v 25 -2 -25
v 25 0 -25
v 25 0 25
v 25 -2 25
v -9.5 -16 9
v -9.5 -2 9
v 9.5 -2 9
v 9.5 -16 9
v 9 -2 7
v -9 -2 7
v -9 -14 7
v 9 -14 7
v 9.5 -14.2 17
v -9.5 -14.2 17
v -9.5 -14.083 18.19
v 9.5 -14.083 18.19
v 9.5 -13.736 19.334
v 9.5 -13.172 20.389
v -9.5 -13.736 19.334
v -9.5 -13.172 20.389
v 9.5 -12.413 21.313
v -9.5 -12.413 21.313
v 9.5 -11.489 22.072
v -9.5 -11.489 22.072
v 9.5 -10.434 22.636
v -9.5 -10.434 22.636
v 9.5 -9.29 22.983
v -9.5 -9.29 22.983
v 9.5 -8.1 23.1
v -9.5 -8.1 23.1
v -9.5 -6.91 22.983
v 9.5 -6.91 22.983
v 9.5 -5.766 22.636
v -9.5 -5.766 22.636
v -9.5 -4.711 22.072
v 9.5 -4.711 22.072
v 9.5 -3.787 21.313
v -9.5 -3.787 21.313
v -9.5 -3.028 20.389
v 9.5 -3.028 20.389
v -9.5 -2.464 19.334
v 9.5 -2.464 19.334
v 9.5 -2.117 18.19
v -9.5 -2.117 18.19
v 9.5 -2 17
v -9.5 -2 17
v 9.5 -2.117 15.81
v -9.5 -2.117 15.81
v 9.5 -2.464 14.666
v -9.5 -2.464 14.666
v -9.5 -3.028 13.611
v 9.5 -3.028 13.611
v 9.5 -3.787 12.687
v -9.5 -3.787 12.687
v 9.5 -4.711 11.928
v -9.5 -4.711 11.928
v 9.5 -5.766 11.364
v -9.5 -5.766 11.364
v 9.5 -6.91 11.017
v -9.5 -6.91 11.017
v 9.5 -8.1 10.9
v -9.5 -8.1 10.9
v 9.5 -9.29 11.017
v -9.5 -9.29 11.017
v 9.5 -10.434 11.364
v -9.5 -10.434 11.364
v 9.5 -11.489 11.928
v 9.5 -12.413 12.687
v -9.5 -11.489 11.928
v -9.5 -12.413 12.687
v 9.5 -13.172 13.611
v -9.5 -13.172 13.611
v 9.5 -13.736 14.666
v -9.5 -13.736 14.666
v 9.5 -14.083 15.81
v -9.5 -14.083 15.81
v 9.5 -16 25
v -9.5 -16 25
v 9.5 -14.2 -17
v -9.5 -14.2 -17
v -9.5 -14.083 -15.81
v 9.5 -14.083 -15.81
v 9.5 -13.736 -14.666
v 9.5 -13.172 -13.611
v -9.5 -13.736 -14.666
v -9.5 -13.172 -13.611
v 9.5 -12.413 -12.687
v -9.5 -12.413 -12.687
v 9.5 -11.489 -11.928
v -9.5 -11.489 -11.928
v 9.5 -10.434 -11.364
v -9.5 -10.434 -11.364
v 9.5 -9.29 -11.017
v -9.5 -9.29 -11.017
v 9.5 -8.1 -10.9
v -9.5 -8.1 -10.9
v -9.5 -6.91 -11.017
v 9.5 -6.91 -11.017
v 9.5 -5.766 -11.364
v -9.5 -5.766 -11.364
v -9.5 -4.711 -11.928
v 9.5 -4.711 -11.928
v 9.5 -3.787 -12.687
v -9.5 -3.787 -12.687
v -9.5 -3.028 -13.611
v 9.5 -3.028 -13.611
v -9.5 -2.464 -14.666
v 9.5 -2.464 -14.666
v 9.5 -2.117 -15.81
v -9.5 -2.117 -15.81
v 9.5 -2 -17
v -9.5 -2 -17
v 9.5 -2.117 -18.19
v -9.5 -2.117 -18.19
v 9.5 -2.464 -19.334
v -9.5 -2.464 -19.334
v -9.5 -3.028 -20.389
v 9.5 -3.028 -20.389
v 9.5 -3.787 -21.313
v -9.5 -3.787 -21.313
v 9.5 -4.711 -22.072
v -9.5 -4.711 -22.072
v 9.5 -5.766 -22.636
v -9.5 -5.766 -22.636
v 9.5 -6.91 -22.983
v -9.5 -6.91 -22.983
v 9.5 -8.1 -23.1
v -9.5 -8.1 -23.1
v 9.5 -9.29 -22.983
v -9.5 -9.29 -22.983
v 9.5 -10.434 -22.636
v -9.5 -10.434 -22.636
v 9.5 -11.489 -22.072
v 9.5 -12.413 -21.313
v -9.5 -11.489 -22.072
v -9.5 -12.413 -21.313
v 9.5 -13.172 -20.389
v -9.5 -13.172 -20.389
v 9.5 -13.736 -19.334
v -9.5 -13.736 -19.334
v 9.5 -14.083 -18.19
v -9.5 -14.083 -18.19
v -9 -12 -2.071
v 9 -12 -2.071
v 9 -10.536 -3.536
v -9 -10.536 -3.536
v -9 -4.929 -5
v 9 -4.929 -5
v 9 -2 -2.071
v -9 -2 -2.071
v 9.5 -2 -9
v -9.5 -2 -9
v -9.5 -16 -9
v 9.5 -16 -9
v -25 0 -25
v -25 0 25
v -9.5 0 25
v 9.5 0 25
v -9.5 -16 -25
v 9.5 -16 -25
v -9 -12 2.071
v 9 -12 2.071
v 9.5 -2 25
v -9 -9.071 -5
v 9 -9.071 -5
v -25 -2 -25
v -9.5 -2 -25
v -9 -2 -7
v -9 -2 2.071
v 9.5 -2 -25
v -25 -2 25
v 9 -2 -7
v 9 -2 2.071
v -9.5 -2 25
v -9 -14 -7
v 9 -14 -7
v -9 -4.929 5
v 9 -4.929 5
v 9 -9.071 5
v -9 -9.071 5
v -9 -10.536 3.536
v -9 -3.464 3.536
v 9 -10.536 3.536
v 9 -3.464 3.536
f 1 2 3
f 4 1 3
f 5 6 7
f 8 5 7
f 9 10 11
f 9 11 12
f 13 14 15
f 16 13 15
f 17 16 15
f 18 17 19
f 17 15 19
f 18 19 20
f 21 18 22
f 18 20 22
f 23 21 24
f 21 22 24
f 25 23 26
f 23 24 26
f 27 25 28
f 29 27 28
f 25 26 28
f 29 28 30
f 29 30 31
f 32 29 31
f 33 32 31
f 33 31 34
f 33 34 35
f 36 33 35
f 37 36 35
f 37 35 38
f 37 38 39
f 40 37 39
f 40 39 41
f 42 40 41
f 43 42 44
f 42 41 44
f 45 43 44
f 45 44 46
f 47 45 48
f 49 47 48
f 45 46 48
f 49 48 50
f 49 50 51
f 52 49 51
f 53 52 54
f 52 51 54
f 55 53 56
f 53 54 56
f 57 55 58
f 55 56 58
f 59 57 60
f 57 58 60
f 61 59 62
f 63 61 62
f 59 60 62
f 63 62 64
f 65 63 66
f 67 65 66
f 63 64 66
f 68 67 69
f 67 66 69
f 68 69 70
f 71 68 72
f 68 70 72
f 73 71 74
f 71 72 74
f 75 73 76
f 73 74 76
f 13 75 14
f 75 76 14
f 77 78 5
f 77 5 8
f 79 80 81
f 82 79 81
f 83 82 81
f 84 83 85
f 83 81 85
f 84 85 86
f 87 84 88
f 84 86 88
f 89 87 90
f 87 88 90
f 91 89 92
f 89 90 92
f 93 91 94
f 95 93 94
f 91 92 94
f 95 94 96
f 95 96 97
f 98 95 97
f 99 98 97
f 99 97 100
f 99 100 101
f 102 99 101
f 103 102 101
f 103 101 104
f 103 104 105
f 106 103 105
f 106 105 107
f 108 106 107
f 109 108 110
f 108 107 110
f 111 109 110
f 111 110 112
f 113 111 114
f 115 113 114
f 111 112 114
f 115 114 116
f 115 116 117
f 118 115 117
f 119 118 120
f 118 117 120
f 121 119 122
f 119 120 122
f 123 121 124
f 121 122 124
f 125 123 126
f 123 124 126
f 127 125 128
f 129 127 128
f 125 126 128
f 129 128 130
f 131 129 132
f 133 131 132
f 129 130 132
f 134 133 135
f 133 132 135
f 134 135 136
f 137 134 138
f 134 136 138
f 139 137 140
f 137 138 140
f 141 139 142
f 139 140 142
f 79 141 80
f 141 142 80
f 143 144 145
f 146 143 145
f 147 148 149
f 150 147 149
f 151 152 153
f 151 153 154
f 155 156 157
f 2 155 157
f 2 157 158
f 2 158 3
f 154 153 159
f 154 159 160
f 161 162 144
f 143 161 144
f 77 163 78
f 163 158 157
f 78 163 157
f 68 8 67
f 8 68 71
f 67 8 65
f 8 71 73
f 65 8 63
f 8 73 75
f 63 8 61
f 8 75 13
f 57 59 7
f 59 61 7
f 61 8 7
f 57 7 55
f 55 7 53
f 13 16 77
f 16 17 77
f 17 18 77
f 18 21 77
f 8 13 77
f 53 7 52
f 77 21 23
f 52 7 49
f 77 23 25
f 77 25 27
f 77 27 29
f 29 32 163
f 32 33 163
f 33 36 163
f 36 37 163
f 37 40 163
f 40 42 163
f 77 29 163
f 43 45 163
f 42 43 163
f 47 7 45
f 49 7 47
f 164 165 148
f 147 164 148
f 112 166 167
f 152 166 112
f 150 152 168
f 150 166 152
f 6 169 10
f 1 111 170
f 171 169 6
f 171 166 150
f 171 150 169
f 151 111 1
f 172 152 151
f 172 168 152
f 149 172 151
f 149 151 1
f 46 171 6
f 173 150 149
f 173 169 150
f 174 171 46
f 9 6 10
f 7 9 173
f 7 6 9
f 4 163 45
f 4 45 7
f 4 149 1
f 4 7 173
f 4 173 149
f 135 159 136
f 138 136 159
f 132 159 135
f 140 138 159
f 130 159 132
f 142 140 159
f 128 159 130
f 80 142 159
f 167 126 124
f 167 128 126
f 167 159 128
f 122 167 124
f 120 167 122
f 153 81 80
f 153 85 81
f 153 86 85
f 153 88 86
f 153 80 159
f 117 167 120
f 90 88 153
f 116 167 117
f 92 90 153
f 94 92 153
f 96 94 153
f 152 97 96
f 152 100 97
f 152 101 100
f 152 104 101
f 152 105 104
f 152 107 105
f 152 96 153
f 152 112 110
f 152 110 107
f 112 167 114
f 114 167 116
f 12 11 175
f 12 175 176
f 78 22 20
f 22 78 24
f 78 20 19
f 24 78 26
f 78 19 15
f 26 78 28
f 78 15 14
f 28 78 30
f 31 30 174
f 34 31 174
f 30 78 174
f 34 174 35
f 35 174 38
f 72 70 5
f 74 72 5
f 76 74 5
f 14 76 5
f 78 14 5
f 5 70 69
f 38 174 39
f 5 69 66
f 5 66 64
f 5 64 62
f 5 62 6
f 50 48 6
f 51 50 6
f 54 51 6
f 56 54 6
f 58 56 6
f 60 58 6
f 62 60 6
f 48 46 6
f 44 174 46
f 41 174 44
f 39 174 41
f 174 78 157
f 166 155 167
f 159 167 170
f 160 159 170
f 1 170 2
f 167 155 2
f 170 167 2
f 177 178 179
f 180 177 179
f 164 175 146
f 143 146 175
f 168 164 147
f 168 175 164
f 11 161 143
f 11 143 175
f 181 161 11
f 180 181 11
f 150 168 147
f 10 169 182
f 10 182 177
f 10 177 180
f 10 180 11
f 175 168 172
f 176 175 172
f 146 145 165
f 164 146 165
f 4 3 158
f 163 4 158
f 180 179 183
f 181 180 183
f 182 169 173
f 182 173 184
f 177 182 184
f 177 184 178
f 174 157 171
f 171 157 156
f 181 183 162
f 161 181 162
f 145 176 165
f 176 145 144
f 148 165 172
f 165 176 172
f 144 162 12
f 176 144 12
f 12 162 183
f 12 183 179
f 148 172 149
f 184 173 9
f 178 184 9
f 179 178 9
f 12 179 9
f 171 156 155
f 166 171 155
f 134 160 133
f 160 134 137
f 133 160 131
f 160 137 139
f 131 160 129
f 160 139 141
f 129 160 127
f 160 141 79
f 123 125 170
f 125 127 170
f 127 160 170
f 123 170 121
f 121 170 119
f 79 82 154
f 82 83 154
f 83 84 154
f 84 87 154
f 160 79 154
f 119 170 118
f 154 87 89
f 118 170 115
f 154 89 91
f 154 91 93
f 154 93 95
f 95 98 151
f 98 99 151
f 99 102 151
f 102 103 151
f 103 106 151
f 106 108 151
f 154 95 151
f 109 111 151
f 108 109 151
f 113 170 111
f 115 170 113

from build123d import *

# Parameters (mm, degrees)
F0_W     = 18
F0_H     = 14
F0_W_2   = 19
F0_H_2   = 16
F1_DEPTH = 2
F2_DEPTH = 14
F3_DEPTH = 16
F5_D     = 12.2
F7_D     = 12.2
F9_DEPTH = 25


# Not quite as in the source:
# - ends of sketch curves that miss each other by under 0.0002 mm in the source are joined


with BuildPart() as f1:
    # F0 (on Front) → F1 (new body)
    with BuildSketch(Plane.XZ):
        Polygon((9.5000003055, -25), (25, -25), (25, 25), (9.5000003055, 25), (9.5000003055, 8.9999977499), (-9.4999996945, 8.9999977499), (-9.4999996945, 24.9999977499), (-25, 25), (-25, -25), (-9.4999996945, -25), (-9.4999996945, -9), (9.5000003055, -9), align=None)
        Rectangle(F0_W, F0_H, mode=Mode.SUBTRACT)
        with Locations((3.055e-07, -17)):
            Rectangle(F0_W_2, F0_H_2)
        Polygon((9.5000003055, 8.9999977499), (9.5000003055, 24.9999977499), (-9.4999996945, 25), (-9.4999996945, 8.9999977499), align=None)
    extrude(amount=F1_DEPTH)

    # F0 (on Front) → F2 (join)
    with BuildSketch(Plane.XZ):
        Rectangle(F0_W, F0_H)
    extrude(amount=F2_DEPTH)

    # F0 (on Front) → F3 (join)
    with BuildSketch(Plane.XZ):
        with Locations((3.055e-07, -17)):
            Rectangle(F0_W_2, F0_H_2)
        Polygon((9.5000003055, 8.9999977499), (9.5000003055, 24.9999977499), (-9.4999996945, 25), (-9.4999996945, 8.9999977499), align=None)
    extrude(amount=F3_DEPTH)

    # F5 (through all)
    with Locations(Plane.YZ.offset(9.5000003055)):
        with Locations((-8.1, -17)):
            Hole(F5_D / 2)

    # F7 (through all)
    with Locations(Plane.YZ.offset(9.5000003055)):
        with Locations((-8.1, 16.9999977499)):
            Hole(F7_D / 2)

    # F8 (on face) → F9 (cut)
    with BuildSketch(Plane.YZ.offset(9)):
        with BuildLine():
            Line((-12.0000001043, -2.0710677001), (-10.5355339977, -3.5355338068))
            ThreePointArc((-10.5355339977, -3.5355338068), (-11.6193977653, -1.9134170539), (-12.0000001043, 1.212e-07))
            Line((-12.0000001043, 1.212e-07), (-12.0000001043, -2.0710677001))
        make_face()
        with BuildLine():
            ThreePointArc((-2.0000001043, 1.118e-07), (-2.3806024392, 1.9134172673), (-3.4644661888, 3.5355340081))
            ThreePointArc((-3.4644661888, 3.5355340081), (-5.0865829362, 4.6193977717), (-7.0000001043, 5.0000001118))
            ThreePointArc((-7.0000001043, 5.0000001118), (-8.9134172661, 4.6193977743), (-10.5355340102, 3.5355340177))
            ThreePointArc((-10.5355340102, 3.5355340177), (-11.6193977651, 1.9134172779), (-12.0000001043, 1.212e-07))
            ThreePointArc((-12.0000001043, 1.212e-07), (-11.6193977653, -1.9134170539), (-10.5355339977, -3.5355338068))
            ThreePointArc((-10.5355339977, -3.5355338068), (-8.9134172579, -4.6193975542), (-7.0000001043, -4.9999998882))
            ThreePointArc((-7.0000001043, -4.9999998882), (-5.0865829425, -4.6193975508), (-3.4644661984, -3.5355337942))
            ThreePointArc((-3.4644661984, -3.5355337942), (-2.3806024418, -1.9134170501), (-2.0000001043, 1.118e-07))
        make_face()
        with BuildLine():
            ThreePointArc((-12.0000001043, 1.212e-07), (-11.6193977651, 1.9134172779), (-10.5355340102, 3.5355340177))
            Line((-10.5355340102, 3.5355340177), (-12.0000001043, 2.0710679236))
            Line((-12.0000001043, 2.0710679236), (-12.0000001043, 1.212e-07))
        make_face()
        with BuildLine():
            ThreePointArc((-10.5355340102, 3.5355340177), (-8.9134172661, 4.6193977743), (-7.0000001043, 5.0000001118))
            Line((-7.0000001043, 5.0000001118), (-9.0710679162, 5.0000001118))
            Line((-9.0710679162, 5.0000001118), (-10.5355340102, 3.5355340177))
        make_face()
        with BuildLine():
            ThreePointArc((-7.0000001043, 5.0000001118), (-5.0865829362, 4.6193977717), (-3.4644661888, 3.5355340081))
            Line((-3.4644661888, 3.5355340081), (-4.9289322924, 5.0000001118))
            Line((-4.9289322924, 5.0000001118), (-7.0000001043, 5.0000001118))
        make_face()
        with BuildLine():
            Line((-3.4644661984, -3.5355337942), (-2.0000000522, -2.071067648))
            Line((-2.0000001043, -2.071067648), (-2.0000001043, 1.118e-07))
            ThreePointArc((-2.0000001043, 1.118e-07), (-2.3806024418, -1.9134170501), (-3.4644661984, -3.5355337942))
        make_face()
        with BuildLine():
            Line((-2.0000001043, 1.118e-07), (-2.0000001043, 2.0710678715))
            Line((-2.0000000522, 2.0710678715), (-3.4644661888, 3.5355340081))
            ThreePointArc((-3.4644661888, 3.5355340081), (-2.3806024392, 1.9134172673), (-2.0000001043, 1.118e-07))
        make_face()
        with BuildLine():
            Line((-4.9289322924, -4.9999998882), (-3.4644661984, -3.5355337942))
            ThreePointArc((-3.4644661984, -3.5355337942), (-5.0865829425, -4.6193975508), (-7.0000001043, -4.9999998882))
            Line((-7.0000001043, -4.9999998882), (-4.9289322924, -4.9999998882))
        make_face()
        with BuildLine():
            Line((-9.0710679162, -4.9999998882), (-7.0000001043, -4.9999998882))
            ThreePointArc((-7.0000001043, -4.9999998882), (-8.9134172579, -4.6193975542), (-10.5355339977, -3.5355338068))
            Line((-10.5355339977, -3.5355338068), (-9.0710679162, -4.9999998882))
        make_face()
    extrude(amount=-F9_DEPTH, mode=Mode.SUBTRACT)


solid = f1.part
